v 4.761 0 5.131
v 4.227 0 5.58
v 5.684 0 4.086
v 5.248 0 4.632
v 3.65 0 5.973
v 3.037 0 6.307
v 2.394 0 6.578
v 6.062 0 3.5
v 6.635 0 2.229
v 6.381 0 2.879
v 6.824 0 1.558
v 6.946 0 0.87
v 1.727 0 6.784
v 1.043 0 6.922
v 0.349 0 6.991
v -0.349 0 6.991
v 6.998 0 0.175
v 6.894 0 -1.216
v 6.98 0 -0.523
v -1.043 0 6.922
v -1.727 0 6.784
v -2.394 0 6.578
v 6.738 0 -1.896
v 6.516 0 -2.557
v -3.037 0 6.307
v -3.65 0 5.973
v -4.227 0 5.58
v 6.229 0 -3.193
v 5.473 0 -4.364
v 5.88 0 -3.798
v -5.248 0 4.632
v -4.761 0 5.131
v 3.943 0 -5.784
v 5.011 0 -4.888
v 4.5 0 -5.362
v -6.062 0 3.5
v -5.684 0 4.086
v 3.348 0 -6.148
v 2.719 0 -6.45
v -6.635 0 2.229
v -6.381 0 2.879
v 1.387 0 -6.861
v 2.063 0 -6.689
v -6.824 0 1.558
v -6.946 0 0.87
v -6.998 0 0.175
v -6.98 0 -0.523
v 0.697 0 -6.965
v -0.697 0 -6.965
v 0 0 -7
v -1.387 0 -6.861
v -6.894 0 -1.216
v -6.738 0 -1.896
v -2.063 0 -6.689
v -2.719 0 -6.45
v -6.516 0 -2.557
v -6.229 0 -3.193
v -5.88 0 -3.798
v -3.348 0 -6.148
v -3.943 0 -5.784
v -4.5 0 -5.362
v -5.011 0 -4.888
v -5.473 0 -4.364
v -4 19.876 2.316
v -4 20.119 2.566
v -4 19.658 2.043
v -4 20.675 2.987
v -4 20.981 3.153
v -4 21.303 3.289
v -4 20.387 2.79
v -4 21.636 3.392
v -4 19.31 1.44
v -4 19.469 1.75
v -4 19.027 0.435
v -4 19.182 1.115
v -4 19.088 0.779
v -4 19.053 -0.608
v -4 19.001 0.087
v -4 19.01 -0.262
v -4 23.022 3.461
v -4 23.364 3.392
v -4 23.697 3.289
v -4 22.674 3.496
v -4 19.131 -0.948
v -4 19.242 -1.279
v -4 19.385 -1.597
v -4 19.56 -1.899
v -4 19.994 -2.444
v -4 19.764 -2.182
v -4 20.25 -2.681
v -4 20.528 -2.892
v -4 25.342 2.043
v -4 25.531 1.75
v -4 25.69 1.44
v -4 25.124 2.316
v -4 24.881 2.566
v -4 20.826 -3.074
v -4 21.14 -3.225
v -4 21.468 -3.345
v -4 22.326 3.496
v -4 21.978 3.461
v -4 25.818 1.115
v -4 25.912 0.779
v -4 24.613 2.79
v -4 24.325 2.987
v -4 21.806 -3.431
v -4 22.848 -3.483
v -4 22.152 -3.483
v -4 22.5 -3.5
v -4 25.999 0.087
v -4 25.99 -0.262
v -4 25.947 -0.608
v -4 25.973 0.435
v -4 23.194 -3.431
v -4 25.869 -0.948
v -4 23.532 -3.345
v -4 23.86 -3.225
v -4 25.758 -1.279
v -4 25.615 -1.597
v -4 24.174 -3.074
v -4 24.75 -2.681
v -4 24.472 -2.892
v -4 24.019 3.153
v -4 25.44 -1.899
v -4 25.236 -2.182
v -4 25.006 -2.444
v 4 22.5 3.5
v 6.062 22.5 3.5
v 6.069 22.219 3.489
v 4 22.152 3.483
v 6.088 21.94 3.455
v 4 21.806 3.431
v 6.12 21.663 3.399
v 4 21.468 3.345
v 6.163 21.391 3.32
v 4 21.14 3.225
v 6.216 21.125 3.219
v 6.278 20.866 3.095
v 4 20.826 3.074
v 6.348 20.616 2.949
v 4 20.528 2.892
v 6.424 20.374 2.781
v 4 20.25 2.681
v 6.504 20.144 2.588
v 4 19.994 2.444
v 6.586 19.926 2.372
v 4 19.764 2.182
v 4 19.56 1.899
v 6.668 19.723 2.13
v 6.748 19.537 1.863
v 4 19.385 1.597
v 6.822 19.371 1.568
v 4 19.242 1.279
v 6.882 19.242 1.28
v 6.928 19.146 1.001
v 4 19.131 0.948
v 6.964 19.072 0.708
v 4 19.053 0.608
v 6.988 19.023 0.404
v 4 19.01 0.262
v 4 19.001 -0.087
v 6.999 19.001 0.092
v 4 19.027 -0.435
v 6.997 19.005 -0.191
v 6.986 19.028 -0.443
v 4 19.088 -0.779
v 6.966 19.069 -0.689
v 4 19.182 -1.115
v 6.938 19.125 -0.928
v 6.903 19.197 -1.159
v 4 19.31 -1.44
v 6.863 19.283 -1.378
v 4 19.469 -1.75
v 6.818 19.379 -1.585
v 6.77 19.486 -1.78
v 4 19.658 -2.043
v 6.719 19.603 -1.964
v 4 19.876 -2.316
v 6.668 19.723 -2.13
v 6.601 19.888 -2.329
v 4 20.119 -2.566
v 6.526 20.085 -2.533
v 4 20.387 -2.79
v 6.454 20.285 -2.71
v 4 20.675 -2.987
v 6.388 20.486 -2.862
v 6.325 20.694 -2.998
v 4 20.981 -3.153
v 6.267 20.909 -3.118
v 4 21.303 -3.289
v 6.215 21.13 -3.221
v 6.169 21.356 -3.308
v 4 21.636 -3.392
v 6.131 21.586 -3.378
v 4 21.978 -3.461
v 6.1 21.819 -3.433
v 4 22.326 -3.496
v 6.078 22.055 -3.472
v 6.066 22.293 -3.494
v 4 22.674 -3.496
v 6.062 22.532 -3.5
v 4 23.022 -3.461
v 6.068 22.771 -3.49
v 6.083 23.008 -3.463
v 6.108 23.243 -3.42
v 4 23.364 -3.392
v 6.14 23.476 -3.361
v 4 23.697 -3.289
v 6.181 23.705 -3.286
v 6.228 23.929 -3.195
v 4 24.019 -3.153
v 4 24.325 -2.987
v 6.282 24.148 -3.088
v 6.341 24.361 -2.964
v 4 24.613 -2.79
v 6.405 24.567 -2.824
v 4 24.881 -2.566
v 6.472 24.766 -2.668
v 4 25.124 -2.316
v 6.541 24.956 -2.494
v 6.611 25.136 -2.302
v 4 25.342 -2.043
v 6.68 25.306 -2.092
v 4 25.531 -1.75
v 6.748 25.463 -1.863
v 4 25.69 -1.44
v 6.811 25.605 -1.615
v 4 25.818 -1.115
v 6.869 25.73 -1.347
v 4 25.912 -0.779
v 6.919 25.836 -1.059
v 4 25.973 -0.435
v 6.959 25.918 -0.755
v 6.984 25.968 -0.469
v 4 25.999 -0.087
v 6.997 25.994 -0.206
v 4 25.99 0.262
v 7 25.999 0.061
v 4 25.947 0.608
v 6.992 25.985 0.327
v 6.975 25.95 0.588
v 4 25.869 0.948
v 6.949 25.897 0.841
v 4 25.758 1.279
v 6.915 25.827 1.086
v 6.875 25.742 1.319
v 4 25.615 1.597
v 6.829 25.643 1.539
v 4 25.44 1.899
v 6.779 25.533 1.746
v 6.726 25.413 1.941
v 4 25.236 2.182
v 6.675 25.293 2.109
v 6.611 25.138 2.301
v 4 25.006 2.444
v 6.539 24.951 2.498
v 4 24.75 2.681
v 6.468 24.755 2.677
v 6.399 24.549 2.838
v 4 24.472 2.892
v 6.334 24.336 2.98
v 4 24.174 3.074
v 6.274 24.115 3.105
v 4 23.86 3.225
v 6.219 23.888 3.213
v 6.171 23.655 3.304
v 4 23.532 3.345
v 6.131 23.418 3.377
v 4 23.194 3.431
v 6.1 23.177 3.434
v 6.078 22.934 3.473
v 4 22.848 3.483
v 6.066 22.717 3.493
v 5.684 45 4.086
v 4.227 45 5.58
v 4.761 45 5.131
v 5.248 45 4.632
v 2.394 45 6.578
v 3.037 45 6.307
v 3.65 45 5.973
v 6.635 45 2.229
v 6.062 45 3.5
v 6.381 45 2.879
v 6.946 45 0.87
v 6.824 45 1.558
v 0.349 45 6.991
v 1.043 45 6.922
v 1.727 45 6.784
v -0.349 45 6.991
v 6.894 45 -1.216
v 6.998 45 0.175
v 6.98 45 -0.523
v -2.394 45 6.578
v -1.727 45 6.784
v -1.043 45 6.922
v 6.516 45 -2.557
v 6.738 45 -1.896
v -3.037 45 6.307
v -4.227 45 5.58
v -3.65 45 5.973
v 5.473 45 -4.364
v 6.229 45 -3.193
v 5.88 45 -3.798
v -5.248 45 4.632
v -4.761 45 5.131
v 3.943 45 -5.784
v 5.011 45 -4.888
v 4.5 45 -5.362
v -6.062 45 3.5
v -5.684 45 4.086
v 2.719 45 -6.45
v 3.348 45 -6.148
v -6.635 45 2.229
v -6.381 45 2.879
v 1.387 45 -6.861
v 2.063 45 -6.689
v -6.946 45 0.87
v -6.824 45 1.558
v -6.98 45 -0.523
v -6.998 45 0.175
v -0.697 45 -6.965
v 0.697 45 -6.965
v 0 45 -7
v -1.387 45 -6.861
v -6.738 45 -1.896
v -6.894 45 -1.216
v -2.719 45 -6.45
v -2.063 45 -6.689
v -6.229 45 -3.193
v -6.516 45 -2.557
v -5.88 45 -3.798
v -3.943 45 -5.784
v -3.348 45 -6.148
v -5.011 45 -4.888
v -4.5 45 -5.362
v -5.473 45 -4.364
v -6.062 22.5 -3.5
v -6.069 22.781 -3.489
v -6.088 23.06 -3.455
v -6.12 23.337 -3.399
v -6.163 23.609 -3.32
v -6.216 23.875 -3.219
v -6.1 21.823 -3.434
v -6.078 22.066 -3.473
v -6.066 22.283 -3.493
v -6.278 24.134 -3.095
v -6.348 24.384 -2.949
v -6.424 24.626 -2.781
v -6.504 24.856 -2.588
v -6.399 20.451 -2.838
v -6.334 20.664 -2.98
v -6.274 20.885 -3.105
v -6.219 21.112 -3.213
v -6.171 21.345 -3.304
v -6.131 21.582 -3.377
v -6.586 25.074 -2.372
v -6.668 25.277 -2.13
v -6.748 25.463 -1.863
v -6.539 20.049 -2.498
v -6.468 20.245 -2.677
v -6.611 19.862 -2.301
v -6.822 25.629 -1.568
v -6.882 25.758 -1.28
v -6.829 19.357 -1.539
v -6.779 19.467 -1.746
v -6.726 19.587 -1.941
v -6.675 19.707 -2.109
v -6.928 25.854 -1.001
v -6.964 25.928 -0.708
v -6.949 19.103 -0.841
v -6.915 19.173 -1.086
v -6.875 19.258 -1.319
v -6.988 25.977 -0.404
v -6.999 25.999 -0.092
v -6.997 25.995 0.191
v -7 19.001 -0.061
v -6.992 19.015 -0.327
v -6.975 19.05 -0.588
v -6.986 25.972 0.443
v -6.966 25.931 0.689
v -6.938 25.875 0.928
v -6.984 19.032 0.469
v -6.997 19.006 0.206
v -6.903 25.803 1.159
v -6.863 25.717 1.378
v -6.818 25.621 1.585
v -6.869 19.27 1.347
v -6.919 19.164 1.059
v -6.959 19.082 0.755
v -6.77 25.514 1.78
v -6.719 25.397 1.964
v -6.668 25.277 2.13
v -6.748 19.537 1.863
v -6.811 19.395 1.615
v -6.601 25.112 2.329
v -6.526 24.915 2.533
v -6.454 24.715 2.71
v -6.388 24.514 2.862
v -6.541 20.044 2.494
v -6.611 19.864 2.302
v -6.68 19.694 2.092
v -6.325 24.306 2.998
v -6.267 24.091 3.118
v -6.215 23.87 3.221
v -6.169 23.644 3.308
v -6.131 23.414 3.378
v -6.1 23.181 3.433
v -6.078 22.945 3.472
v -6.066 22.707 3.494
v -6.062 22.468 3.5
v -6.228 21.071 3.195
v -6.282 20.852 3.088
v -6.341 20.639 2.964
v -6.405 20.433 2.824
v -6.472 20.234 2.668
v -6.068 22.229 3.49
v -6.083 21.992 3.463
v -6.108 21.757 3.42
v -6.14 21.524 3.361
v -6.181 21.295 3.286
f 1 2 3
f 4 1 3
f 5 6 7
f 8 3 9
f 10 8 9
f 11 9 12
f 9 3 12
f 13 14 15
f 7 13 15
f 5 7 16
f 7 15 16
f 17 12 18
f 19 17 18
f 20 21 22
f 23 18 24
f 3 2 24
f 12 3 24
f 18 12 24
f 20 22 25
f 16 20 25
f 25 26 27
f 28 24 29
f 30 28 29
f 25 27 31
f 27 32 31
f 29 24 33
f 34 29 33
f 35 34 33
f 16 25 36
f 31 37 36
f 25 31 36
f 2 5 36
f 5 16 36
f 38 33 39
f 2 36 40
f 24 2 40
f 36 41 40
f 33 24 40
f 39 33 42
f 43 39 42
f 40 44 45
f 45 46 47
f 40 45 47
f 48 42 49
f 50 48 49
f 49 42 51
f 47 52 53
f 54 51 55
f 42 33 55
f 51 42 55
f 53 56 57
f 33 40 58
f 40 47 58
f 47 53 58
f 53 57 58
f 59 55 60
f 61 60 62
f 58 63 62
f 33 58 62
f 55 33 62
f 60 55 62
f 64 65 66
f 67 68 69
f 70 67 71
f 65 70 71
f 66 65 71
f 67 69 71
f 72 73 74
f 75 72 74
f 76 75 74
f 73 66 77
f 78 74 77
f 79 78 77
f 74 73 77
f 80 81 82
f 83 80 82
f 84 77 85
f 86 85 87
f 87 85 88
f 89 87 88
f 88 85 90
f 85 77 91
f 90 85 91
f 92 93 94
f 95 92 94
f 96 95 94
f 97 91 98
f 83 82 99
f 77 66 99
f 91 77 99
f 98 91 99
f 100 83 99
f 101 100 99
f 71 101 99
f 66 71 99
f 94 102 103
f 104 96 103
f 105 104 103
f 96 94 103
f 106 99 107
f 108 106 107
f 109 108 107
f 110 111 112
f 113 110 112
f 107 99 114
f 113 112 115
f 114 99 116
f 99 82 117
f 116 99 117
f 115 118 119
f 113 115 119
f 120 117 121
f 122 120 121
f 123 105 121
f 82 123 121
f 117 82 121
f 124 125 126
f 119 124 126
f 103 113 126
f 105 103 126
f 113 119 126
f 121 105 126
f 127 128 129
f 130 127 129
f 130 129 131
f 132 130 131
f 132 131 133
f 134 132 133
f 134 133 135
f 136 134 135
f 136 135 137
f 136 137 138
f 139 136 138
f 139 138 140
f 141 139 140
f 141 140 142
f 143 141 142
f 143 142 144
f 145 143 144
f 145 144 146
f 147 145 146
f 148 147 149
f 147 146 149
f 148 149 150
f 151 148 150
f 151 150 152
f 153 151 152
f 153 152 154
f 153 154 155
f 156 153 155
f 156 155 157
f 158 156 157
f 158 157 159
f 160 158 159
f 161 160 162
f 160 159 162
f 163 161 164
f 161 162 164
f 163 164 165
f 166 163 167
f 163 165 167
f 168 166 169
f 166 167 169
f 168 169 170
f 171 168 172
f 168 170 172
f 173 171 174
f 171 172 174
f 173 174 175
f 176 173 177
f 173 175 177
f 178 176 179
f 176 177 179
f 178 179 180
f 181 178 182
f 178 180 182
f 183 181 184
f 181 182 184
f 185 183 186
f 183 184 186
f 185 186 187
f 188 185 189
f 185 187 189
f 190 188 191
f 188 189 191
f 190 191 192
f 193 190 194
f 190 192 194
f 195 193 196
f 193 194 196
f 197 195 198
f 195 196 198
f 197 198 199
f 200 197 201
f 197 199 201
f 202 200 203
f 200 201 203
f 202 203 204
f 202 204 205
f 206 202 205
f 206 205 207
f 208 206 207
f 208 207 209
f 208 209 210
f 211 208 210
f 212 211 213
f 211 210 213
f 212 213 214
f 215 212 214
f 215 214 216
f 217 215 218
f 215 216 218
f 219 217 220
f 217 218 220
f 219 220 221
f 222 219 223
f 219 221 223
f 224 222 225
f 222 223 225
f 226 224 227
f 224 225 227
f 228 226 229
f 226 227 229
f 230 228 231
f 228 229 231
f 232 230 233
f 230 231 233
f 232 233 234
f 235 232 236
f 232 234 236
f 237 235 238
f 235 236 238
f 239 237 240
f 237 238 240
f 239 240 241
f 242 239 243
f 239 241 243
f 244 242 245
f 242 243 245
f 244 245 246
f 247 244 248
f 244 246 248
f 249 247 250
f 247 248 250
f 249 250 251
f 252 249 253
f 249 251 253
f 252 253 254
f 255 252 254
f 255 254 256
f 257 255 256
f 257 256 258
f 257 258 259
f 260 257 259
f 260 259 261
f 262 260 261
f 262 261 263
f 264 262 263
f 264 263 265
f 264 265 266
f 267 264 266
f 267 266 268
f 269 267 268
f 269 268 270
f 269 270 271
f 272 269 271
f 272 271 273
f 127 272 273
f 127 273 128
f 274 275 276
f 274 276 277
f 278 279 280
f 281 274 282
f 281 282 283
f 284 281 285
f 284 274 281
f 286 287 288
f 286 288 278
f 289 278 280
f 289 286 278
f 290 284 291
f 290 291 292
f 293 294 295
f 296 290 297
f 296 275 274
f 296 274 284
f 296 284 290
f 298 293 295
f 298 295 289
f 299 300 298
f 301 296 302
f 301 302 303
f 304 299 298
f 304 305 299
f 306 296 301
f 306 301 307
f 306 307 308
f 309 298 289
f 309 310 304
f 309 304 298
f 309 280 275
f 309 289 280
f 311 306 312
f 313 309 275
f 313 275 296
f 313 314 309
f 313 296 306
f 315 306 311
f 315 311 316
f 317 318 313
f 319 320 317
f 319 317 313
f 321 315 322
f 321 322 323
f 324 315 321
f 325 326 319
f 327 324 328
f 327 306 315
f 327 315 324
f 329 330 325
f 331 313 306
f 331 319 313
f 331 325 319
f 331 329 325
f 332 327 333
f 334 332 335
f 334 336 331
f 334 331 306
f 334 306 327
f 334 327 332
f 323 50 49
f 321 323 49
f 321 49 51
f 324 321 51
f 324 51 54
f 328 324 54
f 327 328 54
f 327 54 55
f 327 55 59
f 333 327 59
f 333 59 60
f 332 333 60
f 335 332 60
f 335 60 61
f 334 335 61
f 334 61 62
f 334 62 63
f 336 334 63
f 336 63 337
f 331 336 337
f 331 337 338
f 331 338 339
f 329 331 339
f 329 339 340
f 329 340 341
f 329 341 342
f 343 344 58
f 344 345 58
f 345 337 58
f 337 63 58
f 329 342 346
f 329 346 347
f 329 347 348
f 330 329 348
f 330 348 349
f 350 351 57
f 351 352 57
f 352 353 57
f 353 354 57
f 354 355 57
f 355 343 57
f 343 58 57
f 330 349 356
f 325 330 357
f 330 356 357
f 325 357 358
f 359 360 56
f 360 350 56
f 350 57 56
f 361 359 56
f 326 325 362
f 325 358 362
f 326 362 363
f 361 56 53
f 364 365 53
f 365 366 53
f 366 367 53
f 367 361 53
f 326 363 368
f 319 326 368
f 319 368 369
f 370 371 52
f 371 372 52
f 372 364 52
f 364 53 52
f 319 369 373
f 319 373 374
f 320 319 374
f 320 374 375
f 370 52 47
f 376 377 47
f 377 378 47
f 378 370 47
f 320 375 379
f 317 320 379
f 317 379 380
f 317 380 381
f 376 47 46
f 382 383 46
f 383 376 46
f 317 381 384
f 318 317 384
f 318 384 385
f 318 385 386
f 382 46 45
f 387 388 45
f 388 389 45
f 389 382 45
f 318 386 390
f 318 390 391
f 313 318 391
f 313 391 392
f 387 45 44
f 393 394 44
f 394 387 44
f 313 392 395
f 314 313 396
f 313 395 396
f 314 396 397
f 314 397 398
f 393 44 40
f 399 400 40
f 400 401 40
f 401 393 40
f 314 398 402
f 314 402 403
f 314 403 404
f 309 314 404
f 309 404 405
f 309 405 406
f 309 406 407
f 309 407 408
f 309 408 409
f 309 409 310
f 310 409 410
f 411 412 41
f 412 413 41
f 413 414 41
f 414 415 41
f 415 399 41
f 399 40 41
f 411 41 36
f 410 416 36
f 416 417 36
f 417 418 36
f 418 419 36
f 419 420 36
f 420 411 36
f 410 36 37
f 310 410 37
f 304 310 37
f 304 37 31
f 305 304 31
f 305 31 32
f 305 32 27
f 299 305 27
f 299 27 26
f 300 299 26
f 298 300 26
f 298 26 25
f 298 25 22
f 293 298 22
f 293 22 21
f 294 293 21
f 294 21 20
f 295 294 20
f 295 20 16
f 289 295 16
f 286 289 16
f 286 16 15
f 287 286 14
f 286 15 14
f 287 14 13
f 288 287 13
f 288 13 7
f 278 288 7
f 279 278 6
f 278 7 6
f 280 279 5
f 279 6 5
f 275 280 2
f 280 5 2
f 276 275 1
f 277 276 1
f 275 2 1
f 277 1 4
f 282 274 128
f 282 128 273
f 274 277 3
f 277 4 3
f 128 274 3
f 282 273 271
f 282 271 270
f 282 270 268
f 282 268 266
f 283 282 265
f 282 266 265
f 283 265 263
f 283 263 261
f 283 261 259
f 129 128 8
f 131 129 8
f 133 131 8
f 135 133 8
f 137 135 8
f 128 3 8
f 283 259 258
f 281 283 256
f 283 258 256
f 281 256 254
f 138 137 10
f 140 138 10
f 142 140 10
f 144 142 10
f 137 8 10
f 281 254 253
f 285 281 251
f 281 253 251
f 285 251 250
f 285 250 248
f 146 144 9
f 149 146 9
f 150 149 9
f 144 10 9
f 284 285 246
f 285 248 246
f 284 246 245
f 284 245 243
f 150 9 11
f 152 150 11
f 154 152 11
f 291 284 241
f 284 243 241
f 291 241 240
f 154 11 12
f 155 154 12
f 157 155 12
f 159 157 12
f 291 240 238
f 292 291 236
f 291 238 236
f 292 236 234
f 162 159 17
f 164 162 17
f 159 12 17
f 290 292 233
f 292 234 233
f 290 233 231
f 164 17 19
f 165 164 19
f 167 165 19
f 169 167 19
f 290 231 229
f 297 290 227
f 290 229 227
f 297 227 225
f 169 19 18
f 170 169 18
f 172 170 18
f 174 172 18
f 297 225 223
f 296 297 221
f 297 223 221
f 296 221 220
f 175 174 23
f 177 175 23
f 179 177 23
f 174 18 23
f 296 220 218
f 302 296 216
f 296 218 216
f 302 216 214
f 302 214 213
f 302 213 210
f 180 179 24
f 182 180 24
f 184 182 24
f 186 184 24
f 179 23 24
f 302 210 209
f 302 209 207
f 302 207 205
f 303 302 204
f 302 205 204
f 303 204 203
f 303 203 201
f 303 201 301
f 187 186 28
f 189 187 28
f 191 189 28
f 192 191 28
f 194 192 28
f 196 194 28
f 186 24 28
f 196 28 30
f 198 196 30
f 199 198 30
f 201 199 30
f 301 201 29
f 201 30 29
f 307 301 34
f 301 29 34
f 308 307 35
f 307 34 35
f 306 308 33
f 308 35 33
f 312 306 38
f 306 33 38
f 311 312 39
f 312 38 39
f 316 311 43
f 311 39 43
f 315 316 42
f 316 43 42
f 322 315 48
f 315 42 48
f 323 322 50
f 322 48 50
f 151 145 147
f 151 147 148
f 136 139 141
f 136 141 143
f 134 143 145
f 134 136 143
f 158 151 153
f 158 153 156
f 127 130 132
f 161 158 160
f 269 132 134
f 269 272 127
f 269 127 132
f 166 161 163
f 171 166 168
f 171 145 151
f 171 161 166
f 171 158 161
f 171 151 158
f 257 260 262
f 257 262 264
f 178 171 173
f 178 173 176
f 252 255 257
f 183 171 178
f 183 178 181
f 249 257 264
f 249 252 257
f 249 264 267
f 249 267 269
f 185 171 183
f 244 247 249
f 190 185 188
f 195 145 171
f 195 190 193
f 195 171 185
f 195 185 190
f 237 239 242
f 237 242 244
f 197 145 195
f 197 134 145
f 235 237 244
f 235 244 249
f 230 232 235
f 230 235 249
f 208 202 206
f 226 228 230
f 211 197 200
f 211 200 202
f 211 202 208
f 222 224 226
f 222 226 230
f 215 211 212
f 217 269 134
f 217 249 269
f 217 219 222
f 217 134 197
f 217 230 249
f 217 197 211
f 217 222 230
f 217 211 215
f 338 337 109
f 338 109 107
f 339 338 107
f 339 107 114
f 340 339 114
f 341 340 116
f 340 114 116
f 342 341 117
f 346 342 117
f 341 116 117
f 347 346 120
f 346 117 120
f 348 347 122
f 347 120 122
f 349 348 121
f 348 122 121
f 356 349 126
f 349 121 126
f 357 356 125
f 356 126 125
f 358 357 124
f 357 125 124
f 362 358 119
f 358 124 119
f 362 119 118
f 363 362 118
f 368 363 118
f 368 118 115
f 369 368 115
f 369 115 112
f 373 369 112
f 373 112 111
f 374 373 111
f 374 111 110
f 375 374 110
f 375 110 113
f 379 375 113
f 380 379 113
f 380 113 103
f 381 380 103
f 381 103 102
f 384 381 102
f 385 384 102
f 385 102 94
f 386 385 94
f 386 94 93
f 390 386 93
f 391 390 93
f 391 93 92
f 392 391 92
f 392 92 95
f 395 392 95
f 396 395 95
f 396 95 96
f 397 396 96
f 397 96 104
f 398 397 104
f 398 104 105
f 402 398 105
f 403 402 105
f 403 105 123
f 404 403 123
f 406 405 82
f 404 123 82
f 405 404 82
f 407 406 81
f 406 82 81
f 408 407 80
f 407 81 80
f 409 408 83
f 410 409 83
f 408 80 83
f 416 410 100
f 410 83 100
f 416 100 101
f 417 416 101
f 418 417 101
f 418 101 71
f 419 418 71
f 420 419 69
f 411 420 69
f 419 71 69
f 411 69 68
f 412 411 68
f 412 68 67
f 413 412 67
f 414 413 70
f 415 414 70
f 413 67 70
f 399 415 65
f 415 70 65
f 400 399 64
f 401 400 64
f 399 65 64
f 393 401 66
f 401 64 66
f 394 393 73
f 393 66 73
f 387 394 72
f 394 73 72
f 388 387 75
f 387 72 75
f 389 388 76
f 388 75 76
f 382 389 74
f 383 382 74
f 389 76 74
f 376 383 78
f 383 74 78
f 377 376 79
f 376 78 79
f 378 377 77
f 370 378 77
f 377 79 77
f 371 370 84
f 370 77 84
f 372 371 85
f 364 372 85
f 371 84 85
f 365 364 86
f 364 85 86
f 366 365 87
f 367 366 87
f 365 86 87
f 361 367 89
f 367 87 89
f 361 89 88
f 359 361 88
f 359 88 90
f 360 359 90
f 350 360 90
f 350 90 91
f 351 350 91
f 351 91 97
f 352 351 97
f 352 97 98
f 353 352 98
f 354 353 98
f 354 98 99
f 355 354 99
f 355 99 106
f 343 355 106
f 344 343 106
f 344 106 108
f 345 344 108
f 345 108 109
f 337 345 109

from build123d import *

# Parameters (mm, degrees)
SKETCH_1_R          = 7
EXTRUDE_1_DEPTH     = 45
CUT_EXTRUDE_1_DEPTH = 11
CUT_EXTRUDE_START   = 11
CUT_EXTRUDE_2_DEPTH = 11


with BuildPart() as part:
    # 草图1 → 凸台-拉伸1 (new body)
    with BuildSketch(Plane(origin=(0, 0, 0), x_dir=(1, 0, 0), z_dir=(0, 1, 0))):
        with Locations(Location((0, 0, 0), (0, 0, 90))):
            Circle(SKETCH_1_R)
    extrude(amount=EXTRUDE_1_DEPTH)

    # 草图4 → 切除-拉伸1 (cut)
    with BuildSketch(Plane(origin=(15, 0, 0), x_dir=(0, 0, -1), z_dir=(1, 0, 0))):
        with BuildLine():
            ThreePointArc((3.5, 22.5), (0, 26), (-3.5, 22.5))
            Line((-3.5, 22.5), (3.5, 22.5))
        make_face()
        with BuildLine():
            Line((3.5, 22.5), (-3.5, 22.5))
            ThreePointArc((-3.5, 22.5), (0, 19), (3.5, 22.5))
        make_face()
    extrude(amount=-CUT_EXTRUDE_1_DEPTH, mode=Mode.SUBTRACT)

    # 草图5 → 切除-拉伸2 (cut)
    with BuildSketch(Plane(origin=(-15, 0, 0), x_dir=(0, 0, -1), z_dir=(1, 0, 0)).offset(CUT_EXTRUDE_START)):
        with BuildLine():
            ThreePointArc((-3.5, 22.5), (0, 19), (3.5, 22.5))
            Line((3.5, 22.5), (-3.5, 22.5))
        make_face()
        with BuildLine():
            Line((-3.5, 22.5), (3.5, 22.5))
            ThreePointArc((3.5, 22.5), (0, 26), (-3.5, 22.5))
        make_face()
    extrude(amount=-CUT_EXTRUDE_2_DEPTH, mode=Mode.SUBTRACT)


solid = part.part
